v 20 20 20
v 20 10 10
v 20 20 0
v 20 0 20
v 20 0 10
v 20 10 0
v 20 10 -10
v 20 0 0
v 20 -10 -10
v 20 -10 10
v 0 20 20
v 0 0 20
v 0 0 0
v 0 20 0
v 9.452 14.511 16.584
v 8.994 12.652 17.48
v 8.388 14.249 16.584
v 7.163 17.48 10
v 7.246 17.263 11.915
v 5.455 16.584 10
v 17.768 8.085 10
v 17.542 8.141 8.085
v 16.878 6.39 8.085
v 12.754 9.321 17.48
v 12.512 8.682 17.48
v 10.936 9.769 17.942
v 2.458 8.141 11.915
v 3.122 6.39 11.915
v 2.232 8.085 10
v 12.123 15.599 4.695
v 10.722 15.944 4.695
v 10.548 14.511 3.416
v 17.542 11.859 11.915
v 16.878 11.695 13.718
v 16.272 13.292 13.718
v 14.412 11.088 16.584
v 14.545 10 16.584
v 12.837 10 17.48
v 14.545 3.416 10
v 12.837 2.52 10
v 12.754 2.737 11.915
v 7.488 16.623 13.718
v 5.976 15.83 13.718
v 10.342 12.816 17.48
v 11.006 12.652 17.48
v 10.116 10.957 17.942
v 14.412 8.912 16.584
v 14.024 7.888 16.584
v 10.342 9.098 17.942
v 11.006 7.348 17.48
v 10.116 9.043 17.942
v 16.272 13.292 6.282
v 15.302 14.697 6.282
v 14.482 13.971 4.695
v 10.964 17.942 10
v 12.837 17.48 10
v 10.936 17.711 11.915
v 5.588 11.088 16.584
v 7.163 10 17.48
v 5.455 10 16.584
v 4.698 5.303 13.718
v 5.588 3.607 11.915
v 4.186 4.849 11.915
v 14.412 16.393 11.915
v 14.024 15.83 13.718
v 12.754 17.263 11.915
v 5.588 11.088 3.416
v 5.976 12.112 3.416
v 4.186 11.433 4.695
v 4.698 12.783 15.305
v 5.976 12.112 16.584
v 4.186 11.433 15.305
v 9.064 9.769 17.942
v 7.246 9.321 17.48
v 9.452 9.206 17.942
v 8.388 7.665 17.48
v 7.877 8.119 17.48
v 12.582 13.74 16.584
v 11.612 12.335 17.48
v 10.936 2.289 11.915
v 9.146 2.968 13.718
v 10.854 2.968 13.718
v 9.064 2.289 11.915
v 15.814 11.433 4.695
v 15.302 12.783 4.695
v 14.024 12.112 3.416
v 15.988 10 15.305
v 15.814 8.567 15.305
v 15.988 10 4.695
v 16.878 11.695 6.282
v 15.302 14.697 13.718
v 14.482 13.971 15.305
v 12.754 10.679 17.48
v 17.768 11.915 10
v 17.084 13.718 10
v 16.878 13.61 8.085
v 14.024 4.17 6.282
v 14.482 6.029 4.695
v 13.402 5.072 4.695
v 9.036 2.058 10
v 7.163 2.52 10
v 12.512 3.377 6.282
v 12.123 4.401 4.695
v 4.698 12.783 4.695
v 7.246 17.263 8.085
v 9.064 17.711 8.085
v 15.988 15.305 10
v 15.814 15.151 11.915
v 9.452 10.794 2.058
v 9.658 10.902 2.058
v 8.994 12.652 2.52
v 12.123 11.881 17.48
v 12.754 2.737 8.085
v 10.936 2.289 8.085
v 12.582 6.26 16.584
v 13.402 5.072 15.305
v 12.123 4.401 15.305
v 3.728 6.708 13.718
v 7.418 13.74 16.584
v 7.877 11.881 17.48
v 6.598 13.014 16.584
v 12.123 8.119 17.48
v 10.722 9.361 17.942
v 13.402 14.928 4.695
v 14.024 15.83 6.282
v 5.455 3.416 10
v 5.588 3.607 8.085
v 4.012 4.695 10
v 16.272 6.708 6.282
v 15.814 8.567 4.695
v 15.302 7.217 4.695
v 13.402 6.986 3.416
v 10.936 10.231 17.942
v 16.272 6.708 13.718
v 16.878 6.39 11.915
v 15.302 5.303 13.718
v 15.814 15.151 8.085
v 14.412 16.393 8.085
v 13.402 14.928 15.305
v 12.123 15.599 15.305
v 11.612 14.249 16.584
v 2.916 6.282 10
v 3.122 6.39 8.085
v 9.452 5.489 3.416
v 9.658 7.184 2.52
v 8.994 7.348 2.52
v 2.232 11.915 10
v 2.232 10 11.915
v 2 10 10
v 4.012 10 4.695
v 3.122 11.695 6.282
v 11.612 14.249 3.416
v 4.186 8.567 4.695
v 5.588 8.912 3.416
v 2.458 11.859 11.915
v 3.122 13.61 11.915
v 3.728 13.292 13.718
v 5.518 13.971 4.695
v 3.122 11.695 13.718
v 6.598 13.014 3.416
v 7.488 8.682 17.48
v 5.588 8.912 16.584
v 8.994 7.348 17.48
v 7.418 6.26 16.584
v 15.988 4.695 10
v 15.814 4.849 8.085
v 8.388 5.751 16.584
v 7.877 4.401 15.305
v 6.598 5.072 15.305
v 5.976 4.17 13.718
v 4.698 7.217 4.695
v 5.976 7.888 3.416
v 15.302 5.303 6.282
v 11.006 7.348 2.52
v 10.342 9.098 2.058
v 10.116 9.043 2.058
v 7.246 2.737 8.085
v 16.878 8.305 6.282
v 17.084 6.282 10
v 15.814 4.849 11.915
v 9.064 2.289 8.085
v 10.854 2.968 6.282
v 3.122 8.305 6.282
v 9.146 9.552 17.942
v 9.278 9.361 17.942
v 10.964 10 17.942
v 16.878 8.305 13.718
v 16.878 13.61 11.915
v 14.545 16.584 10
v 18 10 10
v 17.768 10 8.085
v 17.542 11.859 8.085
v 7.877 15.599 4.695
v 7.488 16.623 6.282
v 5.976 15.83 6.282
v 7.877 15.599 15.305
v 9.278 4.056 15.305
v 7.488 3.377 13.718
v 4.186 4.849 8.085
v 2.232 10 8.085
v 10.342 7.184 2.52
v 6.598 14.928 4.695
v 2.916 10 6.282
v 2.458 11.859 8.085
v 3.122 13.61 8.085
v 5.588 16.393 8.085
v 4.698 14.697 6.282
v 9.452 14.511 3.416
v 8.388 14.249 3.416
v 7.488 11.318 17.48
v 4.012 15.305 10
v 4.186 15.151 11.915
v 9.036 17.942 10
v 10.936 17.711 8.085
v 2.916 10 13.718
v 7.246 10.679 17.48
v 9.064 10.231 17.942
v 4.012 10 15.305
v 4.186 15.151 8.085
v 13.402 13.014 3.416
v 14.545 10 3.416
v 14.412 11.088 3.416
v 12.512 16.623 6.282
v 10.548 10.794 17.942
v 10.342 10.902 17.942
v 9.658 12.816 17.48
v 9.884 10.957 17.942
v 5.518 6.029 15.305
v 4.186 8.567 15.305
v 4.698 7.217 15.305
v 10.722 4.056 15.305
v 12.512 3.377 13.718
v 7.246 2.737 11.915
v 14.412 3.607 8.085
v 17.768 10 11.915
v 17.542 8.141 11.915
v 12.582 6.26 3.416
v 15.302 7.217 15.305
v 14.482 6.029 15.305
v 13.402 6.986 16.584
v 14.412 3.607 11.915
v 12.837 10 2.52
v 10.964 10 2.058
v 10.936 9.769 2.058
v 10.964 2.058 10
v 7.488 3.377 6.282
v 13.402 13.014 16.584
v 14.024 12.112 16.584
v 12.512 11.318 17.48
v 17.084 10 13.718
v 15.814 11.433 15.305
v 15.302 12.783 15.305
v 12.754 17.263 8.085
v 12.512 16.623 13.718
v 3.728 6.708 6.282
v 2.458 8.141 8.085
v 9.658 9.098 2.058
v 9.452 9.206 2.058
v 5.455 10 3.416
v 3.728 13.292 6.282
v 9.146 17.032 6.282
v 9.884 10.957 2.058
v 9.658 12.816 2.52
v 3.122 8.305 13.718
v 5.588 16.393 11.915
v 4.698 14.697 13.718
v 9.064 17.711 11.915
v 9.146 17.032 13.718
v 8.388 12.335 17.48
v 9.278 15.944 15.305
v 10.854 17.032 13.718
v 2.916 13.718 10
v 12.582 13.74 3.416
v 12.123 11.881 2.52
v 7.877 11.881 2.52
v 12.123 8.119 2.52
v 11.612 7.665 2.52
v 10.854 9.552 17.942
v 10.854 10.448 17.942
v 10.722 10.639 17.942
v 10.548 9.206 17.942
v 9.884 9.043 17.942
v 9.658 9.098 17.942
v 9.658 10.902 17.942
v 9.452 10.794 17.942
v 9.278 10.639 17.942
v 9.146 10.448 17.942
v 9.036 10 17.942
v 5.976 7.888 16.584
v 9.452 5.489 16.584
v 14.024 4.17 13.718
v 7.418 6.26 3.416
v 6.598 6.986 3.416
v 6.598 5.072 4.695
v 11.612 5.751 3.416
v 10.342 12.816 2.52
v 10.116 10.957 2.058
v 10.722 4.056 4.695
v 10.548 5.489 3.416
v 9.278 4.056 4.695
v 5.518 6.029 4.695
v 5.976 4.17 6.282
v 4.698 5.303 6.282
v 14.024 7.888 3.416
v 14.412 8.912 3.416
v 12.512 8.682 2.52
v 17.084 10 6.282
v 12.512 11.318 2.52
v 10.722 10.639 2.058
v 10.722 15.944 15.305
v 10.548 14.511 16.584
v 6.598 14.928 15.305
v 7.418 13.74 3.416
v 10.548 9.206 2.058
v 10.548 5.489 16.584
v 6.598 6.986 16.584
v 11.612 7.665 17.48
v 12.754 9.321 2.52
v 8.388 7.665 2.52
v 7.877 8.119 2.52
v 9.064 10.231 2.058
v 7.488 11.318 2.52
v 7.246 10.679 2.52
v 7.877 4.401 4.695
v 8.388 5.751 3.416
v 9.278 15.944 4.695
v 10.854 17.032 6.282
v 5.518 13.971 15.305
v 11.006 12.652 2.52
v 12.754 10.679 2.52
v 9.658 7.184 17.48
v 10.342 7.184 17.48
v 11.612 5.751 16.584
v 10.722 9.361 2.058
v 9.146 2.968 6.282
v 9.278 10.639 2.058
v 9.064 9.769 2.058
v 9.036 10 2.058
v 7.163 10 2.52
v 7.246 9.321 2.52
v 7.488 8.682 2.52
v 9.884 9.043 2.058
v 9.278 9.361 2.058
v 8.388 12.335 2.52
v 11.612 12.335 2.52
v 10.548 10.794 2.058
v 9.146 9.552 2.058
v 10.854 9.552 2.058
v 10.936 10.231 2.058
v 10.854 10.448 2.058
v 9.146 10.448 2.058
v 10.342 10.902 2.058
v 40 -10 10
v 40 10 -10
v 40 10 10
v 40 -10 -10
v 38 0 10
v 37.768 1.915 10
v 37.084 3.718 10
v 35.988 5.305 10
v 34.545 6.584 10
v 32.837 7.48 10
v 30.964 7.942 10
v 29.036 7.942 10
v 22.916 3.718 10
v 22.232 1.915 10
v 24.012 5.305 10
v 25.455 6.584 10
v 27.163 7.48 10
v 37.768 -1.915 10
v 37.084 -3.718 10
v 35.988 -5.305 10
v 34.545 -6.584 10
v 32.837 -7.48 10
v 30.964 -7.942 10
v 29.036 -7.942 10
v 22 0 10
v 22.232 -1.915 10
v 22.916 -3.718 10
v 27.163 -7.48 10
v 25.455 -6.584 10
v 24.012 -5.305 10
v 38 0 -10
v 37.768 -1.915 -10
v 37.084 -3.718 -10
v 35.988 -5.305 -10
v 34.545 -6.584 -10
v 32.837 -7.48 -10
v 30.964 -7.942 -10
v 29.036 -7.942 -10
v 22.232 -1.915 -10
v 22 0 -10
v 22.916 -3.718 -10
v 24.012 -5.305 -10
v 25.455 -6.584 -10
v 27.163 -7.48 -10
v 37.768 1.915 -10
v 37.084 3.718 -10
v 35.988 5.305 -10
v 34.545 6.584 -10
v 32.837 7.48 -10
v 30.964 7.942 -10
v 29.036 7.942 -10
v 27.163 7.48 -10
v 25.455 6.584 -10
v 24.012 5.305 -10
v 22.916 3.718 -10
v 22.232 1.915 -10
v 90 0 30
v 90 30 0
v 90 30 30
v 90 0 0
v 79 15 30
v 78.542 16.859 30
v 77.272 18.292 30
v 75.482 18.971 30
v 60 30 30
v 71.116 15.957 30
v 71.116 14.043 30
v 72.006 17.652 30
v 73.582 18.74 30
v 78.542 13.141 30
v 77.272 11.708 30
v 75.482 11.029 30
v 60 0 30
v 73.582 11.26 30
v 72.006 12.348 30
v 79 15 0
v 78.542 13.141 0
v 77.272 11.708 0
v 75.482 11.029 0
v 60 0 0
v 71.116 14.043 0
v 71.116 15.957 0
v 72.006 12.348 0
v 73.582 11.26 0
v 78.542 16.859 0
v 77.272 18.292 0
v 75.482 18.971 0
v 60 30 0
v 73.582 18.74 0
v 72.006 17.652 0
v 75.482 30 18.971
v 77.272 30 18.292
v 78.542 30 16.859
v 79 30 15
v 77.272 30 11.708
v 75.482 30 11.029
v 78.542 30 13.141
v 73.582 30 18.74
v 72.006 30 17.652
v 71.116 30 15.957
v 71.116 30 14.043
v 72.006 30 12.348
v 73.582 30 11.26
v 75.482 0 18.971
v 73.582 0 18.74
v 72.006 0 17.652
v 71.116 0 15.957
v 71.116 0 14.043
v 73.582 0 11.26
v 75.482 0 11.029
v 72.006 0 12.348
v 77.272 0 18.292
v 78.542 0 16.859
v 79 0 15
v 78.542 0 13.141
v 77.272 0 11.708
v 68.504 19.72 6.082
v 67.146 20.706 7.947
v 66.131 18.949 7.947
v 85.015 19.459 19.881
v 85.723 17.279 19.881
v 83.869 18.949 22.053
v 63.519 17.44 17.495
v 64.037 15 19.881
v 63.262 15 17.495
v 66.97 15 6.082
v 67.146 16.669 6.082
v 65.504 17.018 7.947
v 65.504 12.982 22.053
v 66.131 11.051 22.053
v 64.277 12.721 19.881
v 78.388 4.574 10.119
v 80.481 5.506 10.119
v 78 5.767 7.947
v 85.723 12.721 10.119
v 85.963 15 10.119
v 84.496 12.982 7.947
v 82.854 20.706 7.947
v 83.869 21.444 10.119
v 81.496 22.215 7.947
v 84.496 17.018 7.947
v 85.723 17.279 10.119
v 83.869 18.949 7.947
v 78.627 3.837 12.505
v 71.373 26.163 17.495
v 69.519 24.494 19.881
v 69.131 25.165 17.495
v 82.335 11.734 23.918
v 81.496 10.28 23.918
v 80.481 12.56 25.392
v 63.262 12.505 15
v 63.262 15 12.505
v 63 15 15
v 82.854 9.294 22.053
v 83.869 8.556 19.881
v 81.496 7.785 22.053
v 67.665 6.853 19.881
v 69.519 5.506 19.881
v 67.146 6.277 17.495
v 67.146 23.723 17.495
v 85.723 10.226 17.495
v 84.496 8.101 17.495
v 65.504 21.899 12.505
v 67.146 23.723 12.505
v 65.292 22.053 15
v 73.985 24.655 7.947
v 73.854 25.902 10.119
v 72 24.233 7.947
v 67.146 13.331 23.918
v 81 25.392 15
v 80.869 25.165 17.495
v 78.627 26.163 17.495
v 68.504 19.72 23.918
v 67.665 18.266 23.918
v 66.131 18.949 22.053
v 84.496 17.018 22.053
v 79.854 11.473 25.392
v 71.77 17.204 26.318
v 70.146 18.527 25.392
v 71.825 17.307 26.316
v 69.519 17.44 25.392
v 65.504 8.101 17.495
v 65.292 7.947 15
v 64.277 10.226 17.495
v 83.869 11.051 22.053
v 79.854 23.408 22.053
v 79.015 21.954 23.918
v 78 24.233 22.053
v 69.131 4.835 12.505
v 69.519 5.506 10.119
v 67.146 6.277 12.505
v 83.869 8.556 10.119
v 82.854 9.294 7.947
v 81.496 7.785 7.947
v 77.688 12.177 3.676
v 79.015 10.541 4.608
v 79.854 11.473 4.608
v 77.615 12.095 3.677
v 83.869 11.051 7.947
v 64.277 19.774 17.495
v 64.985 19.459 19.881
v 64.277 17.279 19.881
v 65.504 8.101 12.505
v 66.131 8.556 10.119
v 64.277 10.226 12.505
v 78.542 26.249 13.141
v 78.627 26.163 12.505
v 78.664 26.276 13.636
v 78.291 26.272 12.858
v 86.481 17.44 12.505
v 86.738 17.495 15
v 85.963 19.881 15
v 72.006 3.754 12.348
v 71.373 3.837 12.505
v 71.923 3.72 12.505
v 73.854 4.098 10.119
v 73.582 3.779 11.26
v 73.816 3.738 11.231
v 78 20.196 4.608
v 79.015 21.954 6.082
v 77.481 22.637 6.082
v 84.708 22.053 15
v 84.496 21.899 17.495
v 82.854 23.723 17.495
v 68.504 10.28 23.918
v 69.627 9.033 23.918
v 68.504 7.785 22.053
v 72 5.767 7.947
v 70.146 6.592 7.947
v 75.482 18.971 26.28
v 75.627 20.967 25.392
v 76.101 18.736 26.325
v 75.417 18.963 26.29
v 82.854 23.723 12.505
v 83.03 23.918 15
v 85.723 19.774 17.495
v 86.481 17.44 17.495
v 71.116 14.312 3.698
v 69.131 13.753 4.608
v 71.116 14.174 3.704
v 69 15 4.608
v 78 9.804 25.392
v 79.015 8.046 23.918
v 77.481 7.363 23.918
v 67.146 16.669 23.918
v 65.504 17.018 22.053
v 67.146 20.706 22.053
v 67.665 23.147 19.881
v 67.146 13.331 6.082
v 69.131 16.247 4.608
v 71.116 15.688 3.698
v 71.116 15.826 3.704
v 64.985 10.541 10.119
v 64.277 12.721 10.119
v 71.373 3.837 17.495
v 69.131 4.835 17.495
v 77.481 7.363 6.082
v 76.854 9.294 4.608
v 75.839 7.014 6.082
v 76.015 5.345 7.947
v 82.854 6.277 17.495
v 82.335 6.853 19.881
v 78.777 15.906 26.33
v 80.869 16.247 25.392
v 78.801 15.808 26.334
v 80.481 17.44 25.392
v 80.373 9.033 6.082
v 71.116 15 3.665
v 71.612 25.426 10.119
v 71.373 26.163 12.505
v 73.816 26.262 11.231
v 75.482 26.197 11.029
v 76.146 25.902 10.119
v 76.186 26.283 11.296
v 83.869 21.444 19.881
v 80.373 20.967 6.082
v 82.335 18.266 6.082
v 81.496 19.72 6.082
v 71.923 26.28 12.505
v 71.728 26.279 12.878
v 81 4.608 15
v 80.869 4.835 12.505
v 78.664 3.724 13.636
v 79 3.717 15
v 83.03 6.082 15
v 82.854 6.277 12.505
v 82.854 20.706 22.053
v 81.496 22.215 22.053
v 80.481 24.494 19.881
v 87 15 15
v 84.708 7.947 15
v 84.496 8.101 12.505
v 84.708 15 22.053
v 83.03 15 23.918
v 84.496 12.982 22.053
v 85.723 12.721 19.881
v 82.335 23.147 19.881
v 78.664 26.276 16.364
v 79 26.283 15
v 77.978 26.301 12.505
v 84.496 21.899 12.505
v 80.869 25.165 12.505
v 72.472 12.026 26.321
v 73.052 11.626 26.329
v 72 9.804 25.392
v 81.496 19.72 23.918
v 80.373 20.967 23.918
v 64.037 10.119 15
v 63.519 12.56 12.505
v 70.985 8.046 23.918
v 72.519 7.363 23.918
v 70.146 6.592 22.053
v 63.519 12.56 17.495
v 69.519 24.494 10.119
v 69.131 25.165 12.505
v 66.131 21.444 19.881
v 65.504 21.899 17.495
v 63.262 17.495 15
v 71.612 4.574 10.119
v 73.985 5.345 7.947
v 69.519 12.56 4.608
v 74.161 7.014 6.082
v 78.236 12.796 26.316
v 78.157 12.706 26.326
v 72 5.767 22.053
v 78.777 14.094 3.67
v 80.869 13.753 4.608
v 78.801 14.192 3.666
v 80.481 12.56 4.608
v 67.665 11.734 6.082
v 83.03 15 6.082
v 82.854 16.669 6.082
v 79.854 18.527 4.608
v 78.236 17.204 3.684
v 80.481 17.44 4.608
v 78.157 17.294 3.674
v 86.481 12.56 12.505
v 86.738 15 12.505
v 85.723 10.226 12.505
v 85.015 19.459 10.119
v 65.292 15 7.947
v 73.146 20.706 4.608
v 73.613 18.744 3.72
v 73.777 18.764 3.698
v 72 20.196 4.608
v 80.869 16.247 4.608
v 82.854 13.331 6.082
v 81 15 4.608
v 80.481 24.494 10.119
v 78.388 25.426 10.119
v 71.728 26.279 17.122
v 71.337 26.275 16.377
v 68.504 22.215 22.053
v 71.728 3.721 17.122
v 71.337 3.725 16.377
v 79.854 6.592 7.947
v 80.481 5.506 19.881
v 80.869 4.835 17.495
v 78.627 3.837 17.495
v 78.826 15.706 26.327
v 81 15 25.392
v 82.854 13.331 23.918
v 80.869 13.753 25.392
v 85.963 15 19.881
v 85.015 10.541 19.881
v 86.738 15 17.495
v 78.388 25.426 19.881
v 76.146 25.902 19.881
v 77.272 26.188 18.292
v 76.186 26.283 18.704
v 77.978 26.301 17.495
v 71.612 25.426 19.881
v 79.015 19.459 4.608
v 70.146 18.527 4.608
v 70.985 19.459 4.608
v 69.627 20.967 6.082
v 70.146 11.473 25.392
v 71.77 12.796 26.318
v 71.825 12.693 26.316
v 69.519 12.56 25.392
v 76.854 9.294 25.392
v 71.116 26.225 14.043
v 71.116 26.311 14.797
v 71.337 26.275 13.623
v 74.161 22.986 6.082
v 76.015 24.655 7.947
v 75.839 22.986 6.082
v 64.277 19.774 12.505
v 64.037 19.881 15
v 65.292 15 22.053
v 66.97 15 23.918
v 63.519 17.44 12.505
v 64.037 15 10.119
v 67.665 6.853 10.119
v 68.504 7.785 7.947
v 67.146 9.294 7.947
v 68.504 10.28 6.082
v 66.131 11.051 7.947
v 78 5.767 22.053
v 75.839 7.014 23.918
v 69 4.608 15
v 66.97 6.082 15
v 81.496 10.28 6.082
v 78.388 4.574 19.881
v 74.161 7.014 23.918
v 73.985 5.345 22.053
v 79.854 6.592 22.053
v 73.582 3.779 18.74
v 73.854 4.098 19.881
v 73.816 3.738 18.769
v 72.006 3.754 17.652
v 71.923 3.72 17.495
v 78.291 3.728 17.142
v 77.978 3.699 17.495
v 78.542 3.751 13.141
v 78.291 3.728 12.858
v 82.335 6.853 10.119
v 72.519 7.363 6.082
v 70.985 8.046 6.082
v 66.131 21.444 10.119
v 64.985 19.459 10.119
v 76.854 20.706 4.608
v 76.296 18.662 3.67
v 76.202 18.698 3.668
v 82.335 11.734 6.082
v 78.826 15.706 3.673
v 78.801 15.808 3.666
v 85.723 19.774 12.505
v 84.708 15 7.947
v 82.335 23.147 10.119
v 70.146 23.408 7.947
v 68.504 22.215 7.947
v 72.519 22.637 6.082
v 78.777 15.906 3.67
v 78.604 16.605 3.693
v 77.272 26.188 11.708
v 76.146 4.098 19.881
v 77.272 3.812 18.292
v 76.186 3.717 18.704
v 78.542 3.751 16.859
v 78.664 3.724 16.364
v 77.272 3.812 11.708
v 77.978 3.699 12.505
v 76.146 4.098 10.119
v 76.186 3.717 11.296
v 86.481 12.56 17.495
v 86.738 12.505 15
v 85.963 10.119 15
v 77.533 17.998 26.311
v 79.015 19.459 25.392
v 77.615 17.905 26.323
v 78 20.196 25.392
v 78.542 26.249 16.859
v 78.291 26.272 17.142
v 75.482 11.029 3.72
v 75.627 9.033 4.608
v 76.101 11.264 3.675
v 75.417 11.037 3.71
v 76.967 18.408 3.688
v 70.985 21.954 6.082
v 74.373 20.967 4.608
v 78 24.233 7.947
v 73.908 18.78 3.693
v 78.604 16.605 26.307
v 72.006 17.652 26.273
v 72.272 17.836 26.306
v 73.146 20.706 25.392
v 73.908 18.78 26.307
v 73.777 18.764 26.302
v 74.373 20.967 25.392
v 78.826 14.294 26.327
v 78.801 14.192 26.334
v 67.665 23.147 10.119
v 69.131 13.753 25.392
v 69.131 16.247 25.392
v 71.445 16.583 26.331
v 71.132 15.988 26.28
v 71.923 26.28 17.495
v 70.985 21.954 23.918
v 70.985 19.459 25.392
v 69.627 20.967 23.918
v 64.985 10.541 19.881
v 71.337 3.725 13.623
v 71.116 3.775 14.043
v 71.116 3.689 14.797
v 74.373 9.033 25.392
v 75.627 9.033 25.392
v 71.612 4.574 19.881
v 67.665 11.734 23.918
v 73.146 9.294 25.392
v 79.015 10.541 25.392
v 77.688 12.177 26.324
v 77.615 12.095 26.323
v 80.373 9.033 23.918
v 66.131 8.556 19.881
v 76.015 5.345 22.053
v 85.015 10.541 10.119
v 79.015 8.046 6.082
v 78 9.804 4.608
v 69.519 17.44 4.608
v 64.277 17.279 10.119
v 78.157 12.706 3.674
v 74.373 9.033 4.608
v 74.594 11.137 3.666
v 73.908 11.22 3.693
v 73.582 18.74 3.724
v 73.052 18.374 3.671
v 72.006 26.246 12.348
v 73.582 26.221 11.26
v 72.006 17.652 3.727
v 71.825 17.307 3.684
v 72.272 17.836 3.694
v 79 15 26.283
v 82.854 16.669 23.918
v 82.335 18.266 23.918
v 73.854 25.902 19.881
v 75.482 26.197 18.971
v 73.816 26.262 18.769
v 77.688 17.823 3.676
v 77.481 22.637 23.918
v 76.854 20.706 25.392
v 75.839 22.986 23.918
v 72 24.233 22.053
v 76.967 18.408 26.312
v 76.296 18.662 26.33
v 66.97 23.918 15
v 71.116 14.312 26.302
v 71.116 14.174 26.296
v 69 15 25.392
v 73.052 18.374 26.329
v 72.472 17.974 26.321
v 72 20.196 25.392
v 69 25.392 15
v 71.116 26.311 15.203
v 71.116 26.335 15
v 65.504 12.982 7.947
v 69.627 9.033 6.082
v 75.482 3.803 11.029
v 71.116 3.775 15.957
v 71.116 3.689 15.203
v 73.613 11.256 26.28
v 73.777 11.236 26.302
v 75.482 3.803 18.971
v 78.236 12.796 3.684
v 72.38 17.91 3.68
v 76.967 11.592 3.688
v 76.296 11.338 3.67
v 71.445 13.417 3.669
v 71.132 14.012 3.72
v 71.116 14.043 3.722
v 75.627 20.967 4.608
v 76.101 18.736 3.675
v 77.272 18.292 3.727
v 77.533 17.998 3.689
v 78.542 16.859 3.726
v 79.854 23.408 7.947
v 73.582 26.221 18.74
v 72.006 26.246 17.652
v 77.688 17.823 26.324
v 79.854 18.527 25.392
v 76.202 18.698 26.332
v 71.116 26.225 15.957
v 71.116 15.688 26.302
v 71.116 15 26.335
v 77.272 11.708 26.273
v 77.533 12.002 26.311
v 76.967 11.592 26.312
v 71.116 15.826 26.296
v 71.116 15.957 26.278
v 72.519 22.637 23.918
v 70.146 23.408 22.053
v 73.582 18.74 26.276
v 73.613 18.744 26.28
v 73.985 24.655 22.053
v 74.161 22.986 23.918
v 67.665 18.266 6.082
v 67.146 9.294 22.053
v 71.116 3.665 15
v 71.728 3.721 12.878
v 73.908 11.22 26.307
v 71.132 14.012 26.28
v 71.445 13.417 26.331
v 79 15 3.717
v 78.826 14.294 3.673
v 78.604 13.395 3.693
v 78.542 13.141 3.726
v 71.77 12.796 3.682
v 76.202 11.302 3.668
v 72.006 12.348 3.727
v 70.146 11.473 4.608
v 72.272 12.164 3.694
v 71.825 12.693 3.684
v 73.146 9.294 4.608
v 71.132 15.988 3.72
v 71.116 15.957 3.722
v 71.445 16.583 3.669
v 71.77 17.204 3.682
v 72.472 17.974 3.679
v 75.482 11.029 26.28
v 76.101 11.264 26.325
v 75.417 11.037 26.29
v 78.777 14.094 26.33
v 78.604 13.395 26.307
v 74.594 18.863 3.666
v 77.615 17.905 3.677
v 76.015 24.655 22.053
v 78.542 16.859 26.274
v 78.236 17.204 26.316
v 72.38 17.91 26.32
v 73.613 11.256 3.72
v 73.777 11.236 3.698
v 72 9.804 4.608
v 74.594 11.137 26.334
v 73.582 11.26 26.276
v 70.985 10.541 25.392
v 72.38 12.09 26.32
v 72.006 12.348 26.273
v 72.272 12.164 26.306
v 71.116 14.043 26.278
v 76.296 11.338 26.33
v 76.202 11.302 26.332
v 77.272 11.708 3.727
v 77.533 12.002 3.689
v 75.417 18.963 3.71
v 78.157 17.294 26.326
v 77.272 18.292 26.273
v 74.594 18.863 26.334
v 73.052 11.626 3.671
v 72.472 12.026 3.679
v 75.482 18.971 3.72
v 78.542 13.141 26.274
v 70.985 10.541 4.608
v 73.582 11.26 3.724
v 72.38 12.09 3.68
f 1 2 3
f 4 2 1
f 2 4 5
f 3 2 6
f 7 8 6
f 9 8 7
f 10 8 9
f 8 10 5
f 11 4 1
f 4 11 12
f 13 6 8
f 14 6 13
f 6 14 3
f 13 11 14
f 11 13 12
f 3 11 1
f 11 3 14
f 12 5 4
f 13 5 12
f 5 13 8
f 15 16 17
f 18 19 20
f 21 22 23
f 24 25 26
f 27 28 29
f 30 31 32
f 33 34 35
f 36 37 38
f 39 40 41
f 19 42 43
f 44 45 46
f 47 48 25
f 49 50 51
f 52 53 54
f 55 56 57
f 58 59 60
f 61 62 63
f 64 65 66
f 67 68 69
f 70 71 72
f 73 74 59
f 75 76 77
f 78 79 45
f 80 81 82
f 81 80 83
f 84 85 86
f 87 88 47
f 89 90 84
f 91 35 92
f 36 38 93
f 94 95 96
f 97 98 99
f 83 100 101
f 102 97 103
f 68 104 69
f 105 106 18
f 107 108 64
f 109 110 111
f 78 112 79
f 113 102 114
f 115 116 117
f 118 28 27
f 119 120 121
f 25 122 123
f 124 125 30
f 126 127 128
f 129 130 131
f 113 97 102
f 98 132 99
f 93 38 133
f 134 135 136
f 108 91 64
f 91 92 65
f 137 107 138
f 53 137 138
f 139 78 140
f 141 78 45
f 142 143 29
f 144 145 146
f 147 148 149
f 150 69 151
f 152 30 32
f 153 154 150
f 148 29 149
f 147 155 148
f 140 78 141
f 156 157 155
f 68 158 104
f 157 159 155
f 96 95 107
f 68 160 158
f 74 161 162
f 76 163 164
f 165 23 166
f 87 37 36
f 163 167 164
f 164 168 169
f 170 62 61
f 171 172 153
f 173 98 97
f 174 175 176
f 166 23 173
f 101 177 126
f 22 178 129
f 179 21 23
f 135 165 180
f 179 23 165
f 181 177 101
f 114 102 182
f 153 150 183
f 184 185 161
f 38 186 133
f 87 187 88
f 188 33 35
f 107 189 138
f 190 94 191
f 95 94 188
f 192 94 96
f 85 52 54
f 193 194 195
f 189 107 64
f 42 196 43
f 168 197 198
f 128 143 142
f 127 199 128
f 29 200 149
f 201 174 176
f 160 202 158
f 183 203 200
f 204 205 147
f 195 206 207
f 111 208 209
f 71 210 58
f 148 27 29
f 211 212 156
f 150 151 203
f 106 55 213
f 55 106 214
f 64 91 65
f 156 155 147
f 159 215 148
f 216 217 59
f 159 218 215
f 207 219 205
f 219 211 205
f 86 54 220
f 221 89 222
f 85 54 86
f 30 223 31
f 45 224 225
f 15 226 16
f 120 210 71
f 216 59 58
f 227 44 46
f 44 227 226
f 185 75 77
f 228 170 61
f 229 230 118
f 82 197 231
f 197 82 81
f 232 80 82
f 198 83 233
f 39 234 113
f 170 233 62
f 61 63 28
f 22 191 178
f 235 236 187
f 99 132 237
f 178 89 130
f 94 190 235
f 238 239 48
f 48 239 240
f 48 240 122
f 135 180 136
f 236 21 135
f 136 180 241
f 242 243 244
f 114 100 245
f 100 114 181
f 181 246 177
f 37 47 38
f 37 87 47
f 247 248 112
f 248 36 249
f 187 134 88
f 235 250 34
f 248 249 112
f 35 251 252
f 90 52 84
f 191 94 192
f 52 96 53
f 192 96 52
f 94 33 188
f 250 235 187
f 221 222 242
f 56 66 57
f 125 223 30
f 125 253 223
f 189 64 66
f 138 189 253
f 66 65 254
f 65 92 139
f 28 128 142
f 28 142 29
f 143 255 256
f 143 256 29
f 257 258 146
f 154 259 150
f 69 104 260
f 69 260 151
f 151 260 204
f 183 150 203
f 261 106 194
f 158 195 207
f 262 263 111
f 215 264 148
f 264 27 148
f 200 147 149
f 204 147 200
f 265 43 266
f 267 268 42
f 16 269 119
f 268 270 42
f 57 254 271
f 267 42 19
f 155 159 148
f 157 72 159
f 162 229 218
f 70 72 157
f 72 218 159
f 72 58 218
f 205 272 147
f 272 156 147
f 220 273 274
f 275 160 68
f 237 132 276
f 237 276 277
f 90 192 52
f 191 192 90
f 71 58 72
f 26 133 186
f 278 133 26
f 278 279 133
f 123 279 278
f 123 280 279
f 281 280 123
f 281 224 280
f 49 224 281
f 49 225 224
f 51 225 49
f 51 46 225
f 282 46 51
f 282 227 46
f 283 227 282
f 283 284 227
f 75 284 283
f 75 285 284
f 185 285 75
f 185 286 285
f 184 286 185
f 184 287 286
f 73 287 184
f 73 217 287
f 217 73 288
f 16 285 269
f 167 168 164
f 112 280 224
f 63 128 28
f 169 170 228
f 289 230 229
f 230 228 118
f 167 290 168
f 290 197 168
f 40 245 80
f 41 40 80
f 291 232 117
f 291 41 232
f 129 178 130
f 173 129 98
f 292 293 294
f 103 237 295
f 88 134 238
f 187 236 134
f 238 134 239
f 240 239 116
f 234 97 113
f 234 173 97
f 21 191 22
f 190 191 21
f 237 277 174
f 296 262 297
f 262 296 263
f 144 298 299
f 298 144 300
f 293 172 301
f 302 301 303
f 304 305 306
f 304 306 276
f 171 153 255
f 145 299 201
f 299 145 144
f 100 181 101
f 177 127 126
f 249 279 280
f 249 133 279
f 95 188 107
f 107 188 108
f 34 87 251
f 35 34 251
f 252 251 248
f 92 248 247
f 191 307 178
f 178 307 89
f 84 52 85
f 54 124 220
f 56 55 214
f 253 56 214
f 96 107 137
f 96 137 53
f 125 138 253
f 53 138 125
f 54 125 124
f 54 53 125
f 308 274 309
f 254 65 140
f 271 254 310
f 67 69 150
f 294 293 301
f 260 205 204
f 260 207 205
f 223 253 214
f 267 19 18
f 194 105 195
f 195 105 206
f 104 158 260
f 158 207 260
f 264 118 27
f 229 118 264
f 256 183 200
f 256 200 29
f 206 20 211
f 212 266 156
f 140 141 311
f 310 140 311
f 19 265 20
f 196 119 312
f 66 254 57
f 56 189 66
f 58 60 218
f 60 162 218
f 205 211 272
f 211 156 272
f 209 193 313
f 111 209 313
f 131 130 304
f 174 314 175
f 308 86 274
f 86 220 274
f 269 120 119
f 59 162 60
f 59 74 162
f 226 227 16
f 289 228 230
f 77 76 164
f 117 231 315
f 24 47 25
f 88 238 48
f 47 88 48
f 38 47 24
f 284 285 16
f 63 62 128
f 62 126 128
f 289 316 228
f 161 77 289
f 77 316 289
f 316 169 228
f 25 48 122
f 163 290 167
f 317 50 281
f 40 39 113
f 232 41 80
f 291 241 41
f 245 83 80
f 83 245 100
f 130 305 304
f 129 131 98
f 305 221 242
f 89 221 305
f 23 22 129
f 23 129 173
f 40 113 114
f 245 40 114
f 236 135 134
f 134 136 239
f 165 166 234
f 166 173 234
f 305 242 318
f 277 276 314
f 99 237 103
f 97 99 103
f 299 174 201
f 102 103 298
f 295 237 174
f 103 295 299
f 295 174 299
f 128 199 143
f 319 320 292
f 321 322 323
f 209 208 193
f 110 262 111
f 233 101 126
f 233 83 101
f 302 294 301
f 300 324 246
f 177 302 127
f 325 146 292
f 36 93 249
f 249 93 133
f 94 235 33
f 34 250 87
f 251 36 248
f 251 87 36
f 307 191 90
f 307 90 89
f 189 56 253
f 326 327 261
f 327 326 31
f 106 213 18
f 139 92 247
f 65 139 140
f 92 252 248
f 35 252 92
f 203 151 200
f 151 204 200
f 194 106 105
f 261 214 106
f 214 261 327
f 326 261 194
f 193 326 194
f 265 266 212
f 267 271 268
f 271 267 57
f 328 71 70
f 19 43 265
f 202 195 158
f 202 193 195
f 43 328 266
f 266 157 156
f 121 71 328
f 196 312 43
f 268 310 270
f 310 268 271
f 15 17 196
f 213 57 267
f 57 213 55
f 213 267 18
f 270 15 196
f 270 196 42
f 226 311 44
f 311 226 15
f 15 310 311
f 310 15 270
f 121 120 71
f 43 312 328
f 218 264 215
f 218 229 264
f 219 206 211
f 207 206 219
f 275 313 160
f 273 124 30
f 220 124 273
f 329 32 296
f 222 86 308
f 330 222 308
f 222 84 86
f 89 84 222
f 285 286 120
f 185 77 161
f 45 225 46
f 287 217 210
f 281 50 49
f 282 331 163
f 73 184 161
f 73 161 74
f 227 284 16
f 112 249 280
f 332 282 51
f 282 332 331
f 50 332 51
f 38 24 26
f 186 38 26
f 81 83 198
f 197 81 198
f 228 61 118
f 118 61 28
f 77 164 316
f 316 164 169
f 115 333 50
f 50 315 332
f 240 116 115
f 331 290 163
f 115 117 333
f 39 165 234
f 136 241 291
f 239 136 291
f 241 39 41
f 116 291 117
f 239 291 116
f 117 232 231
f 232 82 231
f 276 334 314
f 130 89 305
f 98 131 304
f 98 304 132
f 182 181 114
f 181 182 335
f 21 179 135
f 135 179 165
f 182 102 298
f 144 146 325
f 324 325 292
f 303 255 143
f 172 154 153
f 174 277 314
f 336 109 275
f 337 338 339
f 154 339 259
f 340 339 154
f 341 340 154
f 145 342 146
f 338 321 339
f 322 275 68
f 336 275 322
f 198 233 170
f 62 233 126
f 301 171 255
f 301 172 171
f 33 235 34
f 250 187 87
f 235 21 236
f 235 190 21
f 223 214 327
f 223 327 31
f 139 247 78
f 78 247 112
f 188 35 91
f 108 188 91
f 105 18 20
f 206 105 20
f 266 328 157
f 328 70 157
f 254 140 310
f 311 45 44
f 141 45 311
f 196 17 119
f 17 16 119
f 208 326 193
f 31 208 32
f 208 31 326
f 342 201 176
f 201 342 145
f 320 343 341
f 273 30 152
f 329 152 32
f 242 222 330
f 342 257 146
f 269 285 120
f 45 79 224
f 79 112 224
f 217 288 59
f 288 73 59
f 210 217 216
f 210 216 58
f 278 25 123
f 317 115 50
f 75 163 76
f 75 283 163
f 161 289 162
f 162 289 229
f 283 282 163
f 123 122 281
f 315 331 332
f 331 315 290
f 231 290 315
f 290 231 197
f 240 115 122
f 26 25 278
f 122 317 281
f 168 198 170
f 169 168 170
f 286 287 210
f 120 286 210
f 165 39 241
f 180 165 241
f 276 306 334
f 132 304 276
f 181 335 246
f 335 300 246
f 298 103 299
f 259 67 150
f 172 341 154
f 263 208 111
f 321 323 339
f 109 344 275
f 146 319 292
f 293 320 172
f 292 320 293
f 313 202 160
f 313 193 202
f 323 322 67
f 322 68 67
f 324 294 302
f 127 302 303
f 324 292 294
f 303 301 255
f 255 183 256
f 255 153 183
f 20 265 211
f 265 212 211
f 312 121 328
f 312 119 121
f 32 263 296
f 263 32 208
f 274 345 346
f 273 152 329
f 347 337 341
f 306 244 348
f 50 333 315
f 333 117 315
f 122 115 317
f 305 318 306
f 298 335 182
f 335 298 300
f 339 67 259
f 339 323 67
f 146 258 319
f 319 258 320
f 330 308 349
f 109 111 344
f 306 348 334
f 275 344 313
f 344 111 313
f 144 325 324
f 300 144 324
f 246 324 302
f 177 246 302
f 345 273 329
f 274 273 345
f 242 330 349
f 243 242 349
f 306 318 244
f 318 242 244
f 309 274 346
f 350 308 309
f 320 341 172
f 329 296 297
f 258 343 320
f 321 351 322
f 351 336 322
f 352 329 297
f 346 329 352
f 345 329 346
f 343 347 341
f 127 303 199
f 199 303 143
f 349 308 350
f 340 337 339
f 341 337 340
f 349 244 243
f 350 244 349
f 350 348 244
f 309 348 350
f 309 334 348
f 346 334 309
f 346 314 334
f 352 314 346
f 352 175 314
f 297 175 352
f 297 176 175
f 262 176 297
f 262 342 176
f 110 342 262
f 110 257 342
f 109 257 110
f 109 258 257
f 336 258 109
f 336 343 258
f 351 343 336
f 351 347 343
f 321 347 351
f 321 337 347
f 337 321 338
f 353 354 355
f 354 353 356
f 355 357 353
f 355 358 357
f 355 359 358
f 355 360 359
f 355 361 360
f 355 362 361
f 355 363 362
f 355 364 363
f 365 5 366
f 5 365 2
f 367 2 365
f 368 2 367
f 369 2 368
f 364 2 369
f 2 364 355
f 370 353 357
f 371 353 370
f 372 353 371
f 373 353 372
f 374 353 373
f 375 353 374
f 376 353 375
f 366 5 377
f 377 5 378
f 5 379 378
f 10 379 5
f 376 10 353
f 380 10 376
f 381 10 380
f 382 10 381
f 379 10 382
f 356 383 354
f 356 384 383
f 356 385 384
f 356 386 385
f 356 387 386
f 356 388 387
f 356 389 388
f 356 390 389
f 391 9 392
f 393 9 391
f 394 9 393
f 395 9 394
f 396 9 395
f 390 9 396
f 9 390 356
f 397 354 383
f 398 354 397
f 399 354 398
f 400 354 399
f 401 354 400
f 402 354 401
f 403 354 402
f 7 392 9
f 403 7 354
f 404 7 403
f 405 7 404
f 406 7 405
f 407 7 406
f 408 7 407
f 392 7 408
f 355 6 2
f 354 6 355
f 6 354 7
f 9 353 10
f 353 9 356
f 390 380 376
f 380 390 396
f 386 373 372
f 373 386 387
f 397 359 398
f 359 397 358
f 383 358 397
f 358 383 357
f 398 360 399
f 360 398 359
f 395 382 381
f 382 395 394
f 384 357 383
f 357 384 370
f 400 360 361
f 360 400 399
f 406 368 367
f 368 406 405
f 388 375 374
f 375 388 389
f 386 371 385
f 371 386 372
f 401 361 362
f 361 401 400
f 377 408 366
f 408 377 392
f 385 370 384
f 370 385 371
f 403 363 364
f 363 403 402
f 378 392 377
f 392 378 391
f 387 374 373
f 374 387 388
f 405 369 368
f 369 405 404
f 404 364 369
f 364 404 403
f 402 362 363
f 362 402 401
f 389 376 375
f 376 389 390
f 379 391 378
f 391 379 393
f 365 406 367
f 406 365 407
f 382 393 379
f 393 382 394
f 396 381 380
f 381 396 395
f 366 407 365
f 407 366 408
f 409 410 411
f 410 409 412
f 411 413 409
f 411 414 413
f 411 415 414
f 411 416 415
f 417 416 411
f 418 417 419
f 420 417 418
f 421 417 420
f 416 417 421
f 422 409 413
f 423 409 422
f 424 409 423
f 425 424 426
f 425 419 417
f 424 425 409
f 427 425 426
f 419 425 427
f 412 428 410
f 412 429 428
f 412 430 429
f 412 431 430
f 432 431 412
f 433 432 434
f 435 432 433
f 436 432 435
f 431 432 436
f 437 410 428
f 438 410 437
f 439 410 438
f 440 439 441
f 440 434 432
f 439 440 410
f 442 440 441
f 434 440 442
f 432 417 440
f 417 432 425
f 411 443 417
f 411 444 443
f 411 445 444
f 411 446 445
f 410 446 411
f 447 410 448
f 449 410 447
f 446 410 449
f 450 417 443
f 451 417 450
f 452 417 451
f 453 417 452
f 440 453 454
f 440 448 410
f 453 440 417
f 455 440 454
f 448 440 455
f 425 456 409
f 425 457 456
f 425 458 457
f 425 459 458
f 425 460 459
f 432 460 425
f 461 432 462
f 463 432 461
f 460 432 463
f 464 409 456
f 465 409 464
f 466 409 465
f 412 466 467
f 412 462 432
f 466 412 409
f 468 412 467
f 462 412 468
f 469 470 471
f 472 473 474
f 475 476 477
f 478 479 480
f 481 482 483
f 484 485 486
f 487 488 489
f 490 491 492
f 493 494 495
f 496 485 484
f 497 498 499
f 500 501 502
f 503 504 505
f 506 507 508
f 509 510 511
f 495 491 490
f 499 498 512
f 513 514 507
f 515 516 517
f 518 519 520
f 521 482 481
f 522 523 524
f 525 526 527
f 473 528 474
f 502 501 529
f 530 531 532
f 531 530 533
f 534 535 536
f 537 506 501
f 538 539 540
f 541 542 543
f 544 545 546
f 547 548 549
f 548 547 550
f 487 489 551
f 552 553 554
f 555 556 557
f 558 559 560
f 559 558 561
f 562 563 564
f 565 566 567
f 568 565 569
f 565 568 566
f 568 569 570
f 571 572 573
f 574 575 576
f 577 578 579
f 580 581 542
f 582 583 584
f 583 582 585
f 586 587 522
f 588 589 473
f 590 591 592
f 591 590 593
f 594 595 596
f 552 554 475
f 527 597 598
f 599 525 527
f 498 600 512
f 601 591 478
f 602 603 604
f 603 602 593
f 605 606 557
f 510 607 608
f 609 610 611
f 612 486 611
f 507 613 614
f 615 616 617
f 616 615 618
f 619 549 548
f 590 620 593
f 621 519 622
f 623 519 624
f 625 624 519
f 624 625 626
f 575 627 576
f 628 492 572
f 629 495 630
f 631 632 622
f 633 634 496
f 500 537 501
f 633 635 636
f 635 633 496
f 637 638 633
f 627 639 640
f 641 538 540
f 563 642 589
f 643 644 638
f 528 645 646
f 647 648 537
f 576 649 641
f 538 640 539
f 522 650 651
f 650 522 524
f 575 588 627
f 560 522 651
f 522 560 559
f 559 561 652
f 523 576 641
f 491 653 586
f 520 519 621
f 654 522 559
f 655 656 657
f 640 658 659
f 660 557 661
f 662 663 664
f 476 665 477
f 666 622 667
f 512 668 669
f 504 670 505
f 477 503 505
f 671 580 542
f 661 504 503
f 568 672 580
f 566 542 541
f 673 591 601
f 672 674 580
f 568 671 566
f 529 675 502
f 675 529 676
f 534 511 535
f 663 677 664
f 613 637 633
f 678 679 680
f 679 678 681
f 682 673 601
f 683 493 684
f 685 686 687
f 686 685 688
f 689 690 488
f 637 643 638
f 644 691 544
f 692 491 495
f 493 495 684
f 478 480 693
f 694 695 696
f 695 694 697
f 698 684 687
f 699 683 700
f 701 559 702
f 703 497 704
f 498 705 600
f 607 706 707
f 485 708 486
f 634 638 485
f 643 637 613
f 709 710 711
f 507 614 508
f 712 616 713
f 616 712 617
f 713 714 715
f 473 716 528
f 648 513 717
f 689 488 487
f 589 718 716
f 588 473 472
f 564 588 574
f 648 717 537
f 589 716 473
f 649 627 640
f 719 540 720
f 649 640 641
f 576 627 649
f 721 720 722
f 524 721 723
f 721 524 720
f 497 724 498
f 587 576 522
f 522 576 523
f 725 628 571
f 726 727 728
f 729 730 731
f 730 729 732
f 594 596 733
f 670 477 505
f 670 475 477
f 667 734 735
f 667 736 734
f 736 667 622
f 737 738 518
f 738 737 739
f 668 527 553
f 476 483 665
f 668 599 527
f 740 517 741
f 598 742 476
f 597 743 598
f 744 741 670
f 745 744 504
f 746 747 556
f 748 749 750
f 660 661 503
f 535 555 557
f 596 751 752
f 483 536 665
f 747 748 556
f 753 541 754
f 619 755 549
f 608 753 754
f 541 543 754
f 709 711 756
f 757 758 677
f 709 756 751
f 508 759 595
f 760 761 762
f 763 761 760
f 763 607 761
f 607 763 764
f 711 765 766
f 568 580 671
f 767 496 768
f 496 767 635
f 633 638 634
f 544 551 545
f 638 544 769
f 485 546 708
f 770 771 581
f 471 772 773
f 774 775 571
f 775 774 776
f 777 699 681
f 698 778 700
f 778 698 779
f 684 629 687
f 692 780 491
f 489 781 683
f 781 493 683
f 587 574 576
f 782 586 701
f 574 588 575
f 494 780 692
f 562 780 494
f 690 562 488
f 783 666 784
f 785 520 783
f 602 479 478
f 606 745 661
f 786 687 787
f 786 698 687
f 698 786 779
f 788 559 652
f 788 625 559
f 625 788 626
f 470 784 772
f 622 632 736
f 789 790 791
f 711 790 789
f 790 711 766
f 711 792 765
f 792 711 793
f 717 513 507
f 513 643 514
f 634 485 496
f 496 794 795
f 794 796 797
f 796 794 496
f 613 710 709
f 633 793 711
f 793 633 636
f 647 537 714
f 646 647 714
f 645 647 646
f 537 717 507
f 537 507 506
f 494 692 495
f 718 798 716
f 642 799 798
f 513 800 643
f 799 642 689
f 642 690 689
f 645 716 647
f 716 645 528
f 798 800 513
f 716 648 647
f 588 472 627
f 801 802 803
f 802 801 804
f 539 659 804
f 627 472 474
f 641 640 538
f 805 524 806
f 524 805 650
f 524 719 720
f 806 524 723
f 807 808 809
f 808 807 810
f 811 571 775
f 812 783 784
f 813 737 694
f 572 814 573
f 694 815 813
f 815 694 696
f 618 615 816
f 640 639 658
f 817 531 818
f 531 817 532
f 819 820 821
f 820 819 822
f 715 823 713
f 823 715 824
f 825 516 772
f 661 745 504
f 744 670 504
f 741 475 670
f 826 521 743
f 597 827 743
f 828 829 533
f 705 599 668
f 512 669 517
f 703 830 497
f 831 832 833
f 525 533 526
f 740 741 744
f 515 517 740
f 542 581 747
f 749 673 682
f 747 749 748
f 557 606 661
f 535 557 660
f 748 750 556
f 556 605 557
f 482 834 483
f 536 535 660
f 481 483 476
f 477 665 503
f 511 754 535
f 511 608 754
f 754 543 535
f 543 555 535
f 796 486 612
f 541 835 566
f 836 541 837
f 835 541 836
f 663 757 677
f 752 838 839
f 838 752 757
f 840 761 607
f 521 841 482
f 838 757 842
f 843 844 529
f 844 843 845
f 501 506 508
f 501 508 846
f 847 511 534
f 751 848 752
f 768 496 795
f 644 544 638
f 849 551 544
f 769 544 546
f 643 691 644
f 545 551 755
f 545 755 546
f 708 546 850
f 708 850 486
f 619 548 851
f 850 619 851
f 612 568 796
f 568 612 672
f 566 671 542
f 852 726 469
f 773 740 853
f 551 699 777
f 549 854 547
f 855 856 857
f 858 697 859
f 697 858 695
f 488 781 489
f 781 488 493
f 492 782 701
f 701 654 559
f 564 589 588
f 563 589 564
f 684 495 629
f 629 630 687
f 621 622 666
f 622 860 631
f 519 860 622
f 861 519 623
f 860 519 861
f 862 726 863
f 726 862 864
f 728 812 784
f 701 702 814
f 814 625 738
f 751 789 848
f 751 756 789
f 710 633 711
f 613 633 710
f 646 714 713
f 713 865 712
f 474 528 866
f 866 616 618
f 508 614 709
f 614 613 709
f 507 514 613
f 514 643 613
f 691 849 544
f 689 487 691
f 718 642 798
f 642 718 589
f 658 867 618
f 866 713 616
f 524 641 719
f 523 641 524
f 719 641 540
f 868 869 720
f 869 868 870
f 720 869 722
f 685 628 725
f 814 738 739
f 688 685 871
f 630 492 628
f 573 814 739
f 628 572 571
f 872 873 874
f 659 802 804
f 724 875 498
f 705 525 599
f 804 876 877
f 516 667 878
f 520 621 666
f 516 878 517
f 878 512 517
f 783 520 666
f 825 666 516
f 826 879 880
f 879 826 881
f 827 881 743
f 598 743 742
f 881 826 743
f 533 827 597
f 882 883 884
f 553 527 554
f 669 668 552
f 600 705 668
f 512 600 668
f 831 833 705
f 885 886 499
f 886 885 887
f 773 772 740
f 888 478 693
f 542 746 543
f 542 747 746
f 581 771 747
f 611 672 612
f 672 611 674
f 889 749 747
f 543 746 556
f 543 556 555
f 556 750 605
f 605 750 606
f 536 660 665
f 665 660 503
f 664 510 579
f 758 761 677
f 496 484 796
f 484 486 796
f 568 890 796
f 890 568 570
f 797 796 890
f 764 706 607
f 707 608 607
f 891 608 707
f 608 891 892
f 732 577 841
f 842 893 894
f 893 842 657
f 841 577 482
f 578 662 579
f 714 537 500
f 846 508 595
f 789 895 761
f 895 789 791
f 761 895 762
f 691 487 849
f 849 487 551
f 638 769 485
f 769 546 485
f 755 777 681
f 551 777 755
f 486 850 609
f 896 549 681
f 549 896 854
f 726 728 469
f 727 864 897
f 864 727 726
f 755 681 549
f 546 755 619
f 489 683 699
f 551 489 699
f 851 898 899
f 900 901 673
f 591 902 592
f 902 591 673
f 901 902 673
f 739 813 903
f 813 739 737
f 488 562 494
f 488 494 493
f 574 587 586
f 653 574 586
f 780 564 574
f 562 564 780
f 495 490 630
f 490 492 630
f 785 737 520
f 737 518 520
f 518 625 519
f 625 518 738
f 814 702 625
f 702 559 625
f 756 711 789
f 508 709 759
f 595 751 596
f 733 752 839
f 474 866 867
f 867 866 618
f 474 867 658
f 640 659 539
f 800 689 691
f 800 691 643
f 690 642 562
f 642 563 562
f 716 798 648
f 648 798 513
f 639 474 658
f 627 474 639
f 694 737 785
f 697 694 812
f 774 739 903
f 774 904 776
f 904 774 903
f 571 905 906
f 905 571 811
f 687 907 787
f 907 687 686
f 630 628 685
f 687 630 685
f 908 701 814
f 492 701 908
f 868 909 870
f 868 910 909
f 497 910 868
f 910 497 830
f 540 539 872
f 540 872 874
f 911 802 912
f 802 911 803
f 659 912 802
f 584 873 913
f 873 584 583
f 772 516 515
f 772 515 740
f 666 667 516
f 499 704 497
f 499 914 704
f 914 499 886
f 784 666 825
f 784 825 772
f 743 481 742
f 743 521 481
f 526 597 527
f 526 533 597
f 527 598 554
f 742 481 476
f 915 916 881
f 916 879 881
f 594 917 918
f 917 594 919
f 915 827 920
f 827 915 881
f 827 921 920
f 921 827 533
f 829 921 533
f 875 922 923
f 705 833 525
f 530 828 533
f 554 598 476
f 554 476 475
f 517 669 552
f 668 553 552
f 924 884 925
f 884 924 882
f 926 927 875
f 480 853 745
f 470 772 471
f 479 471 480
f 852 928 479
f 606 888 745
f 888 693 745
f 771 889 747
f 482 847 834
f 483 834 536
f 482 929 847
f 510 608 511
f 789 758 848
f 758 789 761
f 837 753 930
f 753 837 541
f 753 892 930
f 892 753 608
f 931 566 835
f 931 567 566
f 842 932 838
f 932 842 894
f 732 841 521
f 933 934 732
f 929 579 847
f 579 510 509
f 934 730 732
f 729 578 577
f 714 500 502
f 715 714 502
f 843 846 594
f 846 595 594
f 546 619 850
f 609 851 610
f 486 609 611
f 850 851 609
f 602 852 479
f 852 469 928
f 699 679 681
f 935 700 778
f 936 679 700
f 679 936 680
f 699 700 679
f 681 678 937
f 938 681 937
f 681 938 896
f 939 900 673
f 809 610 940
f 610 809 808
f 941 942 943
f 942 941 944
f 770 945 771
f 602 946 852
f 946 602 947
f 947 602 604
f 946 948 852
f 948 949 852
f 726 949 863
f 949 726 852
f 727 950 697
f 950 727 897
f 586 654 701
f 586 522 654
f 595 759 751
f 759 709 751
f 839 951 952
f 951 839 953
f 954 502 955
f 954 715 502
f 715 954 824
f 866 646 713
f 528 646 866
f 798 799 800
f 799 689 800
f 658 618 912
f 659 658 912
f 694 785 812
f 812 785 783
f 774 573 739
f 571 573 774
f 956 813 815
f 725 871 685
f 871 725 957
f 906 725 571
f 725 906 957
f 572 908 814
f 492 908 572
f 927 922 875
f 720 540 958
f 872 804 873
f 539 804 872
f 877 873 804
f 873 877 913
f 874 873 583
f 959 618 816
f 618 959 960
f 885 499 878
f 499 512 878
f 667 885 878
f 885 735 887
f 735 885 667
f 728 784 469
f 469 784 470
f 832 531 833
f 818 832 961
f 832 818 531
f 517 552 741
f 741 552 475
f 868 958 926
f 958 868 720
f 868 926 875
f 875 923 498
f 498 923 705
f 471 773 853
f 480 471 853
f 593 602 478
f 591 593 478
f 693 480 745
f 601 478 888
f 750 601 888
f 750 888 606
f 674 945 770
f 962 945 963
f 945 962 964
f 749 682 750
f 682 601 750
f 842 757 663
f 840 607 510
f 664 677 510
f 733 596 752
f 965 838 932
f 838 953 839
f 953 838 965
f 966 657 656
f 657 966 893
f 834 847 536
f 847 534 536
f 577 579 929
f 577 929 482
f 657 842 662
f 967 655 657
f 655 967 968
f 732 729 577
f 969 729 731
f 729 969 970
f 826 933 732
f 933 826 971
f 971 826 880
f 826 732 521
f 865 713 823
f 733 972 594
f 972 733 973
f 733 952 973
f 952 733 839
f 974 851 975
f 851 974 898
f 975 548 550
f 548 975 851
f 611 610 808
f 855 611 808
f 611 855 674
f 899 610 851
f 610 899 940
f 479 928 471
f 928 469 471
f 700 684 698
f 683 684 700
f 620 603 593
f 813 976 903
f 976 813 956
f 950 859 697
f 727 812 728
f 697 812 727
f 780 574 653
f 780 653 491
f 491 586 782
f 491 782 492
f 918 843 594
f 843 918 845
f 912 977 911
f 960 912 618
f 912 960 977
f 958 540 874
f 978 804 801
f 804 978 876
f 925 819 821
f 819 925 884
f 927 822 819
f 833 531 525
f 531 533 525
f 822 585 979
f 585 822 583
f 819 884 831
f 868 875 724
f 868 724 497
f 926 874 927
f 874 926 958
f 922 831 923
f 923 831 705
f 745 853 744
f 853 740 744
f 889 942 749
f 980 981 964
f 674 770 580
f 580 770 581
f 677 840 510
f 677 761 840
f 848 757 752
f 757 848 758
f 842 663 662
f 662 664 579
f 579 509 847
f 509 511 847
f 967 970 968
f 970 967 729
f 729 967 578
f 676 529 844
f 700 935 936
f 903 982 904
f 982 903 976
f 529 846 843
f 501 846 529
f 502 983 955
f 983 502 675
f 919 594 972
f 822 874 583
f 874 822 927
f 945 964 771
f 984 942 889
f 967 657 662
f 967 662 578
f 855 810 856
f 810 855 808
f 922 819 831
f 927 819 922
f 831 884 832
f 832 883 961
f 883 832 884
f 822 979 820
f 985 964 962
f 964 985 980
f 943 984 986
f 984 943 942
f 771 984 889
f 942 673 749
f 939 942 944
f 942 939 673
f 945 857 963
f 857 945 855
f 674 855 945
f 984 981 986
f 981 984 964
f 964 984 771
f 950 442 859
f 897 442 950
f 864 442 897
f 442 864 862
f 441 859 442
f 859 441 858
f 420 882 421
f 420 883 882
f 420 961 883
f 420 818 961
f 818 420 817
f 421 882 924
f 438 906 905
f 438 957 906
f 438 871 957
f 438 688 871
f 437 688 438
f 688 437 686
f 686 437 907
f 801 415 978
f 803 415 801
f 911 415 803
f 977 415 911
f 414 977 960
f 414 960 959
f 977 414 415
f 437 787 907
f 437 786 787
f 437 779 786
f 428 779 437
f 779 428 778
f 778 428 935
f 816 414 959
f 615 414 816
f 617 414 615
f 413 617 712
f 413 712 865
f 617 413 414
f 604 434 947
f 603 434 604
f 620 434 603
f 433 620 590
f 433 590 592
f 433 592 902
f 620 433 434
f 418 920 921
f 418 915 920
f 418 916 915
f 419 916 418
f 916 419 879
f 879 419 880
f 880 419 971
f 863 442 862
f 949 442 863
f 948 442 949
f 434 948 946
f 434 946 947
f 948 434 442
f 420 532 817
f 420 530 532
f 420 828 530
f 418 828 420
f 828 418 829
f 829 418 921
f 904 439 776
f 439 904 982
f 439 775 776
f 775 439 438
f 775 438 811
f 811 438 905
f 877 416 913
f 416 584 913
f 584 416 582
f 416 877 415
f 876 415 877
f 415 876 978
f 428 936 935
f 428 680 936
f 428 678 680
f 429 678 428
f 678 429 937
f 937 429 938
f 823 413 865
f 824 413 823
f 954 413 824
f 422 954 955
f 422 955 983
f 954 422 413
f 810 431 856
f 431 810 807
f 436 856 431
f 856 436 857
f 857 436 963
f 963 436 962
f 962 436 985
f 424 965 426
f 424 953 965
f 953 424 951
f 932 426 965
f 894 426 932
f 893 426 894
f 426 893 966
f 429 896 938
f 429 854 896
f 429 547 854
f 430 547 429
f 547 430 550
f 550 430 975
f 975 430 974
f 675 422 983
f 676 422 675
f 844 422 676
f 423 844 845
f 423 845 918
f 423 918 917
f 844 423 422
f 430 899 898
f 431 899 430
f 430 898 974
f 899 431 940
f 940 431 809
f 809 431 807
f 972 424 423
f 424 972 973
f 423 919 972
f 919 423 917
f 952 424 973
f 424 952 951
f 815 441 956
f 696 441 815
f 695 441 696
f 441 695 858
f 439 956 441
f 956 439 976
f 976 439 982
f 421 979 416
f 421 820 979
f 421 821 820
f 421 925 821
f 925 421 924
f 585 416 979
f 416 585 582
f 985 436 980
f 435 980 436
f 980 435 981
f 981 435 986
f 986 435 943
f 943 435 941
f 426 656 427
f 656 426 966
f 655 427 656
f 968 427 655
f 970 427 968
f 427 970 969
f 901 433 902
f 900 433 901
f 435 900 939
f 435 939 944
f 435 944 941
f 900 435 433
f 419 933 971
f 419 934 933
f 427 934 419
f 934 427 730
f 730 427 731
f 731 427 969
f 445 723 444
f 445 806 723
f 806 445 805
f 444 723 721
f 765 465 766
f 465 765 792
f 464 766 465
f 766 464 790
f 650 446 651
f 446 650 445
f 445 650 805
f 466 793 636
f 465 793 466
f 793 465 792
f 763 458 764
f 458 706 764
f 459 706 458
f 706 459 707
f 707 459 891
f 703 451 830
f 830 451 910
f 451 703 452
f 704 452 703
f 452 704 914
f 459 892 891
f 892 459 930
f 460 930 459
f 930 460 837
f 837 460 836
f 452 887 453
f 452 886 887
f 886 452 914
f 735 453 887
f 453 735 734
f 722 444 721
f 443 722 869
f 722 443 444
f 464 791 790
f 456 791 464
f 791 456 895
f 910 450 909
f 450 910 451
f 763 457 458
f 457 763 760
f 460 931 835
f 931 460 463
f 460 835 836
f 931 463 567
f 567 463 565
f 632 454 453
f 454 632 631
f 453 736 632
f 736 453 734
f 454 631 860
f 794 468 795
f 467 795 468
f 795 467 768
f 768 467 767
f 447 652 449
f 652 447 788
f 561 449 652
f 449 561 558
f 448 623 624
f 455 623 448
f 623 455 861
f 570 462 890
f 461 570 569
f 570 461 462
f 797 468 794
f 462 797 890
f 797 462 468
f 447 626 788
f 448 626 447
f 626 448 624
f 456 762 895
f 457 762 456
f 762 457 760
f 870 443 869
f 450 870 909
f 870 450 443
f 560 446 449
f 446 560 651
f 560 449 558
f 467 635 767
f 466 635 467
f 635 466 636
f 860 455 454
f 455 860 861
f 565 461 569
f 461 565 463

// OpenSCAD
// Difference operation tests
union() {
    difference() {
        cube([20, 20, 20]);
        translate([10, 10, 10]) sphere(r=8);
    }
    
    translate([30, 0, 0]) difference() {
        cube([20, 20, 20], center=true);
        cylinder(h=25, r=8, center=true);
    }
    
    translate([60, 0, 0]) difference() {
        cube([30, 30, 30]);
        translate([15, 15, 15]) sphere(r=12);
        translate([15, 15, -1]) cylinder(h=32, r=4);
        translate([15, 15, 15]) rotate([90, 0, 0]) cylinder(h=32, r=4, center=true);
    }
}
